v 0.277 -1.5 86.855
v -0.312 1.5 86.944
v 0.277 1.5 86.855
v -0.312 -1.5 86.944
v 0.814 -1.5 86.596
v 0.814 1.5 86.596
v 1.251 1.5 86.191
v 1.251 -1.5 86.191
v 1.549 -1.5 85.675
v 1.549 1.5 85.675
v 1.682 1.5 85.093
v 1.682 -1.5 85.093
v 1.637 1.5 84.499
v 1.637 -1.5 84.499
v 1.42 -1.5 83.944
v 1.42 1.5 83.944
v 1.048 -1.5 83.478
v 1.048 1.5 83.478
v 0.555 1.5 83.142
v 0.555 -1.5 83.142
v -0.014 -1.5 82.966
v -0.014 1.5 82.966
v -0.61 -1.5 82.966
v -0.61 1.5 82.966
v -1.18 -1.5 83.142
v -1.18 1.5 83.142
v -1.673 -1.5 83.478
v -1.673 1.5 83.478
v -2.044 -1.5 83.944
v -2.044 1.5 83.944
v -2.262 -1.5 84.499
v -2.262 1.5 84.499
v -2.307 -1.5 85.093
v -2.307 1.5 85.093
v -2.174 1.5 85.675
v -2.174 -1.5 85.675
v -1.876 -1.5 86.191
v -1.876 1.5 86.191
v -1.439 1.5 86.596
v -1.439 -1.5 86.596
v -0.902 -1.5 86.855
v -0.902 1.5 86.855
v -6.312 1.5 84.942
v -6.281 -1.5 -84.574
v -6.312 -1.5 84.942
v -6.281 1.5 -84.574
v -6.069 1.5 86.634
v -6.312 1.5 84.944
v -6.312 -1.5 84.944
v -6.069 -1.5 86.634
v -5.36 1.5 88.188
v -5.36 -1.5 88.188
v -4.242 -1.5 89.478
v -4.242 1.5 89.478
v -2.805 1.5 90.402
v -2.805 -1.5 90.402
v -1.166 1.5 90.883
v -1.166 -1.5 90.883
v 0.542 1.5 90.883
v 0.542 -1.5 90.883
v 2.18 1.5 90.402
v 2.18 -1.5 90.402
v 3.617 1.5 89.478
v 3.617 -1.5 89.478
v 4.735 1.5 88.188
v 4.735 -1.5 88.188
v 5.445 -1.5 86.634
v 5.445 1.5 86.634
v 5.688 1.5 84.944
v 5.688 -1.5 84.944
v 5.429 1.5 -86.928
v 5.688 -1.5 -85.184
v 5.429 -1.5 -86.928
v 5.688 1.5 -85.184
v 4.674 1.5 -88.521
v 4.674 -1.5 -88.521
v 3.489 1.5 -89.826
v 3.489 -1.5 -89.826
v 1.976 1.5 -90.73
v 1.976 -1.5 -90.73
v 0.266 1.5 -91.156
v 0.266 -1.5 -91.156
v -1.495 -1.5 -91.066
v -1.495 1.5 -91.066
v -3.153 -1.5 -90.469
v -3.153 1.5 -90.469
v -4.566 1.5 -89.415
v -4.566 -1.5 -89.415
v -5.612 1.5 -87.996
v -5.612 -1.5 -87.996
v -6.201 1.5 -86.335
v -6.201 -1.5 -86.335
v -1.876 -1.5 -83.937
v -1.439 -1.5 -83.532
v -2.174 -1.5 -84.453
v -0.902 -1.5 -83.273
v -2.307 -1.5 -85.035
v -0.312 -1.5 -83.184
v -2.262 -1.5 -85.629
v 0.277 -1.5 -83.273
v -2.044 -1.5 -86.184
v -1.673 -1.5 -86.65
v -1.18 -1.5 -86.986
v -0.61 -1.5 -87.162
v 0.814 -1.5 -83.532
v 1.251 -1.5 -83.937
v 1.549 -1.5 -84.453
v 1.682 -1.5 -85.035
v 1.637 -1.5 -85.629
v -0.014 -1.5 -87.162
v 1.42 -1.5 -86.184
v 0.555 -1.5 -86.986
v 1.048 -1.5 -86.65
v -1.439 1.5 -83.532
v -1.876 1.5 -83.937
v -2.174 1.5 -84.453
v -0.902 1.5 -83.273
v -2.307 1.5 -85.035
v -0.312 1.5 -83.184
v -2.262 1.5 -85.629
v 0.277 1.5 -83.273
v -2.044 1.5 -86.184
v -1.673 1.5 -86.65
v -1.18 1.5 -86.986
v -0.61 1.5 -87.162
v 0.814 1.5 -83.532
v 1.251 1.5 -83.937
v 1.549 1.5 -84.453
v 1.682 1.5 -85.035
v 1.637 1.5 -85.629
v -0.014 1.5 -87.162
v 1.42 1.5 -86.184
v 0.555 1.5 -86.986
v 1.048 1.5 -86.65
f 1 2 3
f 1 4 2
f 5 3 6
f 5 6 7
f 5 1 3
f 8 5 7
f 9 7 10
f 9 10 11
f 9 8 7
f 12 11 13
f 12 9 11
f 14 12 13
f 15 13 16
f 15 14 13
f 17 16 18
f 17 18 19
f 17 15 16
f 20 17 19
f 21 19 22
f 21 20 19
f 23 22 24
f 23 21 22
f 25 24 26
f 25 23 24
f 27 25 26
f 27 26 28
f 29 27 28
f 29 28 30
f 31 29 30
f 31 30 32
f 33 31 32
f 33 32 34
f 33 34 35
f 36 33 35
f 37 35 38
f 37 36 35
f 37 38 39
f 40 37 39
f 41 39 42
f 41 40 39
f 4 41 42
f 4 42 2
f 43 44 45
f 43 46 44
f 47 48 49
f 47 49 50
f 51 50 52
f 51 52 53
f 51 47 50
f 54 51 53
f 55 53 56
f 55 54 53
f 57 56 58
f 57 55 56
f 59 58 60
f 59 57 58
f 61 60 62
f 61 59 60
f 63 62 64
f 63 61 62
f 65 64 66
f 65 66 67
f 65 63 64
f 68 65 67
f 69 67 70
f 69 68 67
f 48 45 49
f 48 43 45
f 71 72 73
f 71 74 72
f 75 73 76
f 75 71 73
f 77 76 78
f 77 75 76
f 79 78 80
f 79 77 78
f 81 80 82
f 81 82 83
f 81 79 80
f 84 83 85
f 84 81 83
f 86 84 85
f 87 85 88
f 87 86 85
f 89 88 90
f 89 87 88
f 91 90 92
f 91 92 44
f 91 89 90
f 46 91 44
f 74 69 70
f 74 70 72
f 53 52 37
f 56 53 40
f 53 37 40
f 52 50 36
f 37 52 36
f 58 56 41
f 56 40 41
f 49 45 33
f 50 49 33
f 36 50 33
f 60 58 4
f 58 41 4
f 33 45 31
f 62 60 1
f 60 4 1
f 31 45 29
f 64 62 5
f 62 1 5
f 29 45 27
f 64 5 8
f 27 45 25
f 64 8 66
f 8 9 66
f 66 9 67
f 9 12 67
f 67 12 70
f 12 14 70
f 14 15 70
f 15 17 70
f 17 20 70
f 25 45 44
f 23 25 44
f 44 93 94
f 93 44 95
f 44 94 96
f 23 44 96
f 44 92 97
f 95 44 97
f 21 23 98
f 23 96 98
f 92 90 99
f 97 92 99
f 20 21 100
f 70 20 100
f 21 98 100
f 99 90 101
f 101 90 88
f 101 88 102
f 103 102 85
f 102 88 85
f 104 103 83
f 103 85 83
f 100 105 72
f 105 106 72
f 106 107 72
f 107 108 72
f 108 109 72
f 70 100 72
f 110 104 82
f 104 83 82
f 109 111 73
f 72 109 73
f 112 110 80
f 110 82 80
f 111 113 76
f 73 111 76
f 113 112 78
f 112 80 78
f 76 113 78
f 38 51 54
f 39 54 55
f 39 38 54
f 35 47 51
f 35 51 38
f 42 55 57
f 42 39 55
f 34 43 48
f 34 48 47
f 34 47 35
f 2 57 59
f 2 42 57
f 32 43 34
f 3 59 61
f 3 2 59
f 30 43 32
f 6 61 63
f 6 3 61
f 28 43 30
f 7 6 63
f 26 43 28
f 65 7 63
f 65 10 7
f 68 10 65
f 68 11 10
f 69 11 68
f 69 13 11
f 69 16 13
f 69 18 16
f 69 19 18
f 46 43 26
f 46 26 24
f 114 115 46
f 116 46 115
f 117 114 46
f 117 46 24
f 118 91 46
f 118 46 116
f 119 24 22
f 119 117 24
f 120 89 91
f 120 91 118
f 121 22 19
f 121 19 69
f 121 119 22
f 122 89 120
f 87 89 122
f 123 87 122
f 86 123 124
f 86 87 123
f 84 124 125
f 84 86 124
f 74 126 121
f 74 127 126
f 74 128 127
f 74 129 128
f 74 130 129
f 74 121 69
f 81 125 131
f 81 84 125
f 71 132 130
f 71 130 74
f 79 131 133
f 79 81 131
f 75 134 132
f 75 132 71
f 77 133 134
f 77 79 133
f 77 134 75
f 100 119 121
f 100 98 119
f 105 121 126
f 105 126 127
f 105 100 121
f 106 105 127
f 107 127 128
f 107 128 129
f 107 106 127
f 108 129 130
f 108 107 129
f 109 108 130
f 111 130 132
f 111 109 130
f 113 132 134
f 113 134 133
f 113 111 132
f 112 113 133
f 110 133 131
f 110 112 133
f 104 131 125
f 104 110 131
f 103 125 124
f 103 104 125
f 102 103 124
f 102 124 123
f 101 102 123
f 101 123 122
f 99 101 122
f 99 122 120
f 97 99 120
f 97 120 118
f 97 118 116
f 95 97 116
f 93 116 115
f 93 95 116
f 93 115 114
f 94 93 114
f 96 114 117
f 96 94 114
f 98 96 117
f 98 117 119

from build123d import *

# Parameters (mm, degrees)
SKETCH1_R           = 2
BOSS_EXTRUDE1_DEPTH = 1.5


with BuildPart() as part:
    # Sketch1 → Boss-Extrude1 (new, symmetric)
    with BuildSketch(Plane(origin=(0, 0, 0), x_dir=(1, 0, 0), z_dir=(0, 1, 0))):
        with BuildLine():
            Line((-6.312384572, -84.941682553), (-6.312384976, -84.943885306))
            ThreePointArc((-6.312384976, -84.943885306), (-0.312384976, -90.943885306), (5.687615024, -84.943885306))
            Line((5.687615024, -84.943885306), (5.687615024, 85.184041034))
            ThreePointArc((5.687615024, 85.184041034), (-0.617919518, 91.176256705), (-6.281267857, 84.573764744))
            Line((-6.281267857, 84.573764744), (-6.312384572, -84.941682553))
        make_face()
        with Locations(Location((-0.312384976, -84.943885306, 0), (0, 0, 270))):
            Circle(SKETCH1_R, mode=Mode.SUBTRACT)
        with Locations(Location((-0.312384976, 85.184041034, 0), (0, 0, 270))):
            Circle(SKETCH1_R, mode=Mode.SUBTRACT)
    extrude(amount=BOSS_EXTRUDE1_DEPTH, both=True)


solid = part.part
